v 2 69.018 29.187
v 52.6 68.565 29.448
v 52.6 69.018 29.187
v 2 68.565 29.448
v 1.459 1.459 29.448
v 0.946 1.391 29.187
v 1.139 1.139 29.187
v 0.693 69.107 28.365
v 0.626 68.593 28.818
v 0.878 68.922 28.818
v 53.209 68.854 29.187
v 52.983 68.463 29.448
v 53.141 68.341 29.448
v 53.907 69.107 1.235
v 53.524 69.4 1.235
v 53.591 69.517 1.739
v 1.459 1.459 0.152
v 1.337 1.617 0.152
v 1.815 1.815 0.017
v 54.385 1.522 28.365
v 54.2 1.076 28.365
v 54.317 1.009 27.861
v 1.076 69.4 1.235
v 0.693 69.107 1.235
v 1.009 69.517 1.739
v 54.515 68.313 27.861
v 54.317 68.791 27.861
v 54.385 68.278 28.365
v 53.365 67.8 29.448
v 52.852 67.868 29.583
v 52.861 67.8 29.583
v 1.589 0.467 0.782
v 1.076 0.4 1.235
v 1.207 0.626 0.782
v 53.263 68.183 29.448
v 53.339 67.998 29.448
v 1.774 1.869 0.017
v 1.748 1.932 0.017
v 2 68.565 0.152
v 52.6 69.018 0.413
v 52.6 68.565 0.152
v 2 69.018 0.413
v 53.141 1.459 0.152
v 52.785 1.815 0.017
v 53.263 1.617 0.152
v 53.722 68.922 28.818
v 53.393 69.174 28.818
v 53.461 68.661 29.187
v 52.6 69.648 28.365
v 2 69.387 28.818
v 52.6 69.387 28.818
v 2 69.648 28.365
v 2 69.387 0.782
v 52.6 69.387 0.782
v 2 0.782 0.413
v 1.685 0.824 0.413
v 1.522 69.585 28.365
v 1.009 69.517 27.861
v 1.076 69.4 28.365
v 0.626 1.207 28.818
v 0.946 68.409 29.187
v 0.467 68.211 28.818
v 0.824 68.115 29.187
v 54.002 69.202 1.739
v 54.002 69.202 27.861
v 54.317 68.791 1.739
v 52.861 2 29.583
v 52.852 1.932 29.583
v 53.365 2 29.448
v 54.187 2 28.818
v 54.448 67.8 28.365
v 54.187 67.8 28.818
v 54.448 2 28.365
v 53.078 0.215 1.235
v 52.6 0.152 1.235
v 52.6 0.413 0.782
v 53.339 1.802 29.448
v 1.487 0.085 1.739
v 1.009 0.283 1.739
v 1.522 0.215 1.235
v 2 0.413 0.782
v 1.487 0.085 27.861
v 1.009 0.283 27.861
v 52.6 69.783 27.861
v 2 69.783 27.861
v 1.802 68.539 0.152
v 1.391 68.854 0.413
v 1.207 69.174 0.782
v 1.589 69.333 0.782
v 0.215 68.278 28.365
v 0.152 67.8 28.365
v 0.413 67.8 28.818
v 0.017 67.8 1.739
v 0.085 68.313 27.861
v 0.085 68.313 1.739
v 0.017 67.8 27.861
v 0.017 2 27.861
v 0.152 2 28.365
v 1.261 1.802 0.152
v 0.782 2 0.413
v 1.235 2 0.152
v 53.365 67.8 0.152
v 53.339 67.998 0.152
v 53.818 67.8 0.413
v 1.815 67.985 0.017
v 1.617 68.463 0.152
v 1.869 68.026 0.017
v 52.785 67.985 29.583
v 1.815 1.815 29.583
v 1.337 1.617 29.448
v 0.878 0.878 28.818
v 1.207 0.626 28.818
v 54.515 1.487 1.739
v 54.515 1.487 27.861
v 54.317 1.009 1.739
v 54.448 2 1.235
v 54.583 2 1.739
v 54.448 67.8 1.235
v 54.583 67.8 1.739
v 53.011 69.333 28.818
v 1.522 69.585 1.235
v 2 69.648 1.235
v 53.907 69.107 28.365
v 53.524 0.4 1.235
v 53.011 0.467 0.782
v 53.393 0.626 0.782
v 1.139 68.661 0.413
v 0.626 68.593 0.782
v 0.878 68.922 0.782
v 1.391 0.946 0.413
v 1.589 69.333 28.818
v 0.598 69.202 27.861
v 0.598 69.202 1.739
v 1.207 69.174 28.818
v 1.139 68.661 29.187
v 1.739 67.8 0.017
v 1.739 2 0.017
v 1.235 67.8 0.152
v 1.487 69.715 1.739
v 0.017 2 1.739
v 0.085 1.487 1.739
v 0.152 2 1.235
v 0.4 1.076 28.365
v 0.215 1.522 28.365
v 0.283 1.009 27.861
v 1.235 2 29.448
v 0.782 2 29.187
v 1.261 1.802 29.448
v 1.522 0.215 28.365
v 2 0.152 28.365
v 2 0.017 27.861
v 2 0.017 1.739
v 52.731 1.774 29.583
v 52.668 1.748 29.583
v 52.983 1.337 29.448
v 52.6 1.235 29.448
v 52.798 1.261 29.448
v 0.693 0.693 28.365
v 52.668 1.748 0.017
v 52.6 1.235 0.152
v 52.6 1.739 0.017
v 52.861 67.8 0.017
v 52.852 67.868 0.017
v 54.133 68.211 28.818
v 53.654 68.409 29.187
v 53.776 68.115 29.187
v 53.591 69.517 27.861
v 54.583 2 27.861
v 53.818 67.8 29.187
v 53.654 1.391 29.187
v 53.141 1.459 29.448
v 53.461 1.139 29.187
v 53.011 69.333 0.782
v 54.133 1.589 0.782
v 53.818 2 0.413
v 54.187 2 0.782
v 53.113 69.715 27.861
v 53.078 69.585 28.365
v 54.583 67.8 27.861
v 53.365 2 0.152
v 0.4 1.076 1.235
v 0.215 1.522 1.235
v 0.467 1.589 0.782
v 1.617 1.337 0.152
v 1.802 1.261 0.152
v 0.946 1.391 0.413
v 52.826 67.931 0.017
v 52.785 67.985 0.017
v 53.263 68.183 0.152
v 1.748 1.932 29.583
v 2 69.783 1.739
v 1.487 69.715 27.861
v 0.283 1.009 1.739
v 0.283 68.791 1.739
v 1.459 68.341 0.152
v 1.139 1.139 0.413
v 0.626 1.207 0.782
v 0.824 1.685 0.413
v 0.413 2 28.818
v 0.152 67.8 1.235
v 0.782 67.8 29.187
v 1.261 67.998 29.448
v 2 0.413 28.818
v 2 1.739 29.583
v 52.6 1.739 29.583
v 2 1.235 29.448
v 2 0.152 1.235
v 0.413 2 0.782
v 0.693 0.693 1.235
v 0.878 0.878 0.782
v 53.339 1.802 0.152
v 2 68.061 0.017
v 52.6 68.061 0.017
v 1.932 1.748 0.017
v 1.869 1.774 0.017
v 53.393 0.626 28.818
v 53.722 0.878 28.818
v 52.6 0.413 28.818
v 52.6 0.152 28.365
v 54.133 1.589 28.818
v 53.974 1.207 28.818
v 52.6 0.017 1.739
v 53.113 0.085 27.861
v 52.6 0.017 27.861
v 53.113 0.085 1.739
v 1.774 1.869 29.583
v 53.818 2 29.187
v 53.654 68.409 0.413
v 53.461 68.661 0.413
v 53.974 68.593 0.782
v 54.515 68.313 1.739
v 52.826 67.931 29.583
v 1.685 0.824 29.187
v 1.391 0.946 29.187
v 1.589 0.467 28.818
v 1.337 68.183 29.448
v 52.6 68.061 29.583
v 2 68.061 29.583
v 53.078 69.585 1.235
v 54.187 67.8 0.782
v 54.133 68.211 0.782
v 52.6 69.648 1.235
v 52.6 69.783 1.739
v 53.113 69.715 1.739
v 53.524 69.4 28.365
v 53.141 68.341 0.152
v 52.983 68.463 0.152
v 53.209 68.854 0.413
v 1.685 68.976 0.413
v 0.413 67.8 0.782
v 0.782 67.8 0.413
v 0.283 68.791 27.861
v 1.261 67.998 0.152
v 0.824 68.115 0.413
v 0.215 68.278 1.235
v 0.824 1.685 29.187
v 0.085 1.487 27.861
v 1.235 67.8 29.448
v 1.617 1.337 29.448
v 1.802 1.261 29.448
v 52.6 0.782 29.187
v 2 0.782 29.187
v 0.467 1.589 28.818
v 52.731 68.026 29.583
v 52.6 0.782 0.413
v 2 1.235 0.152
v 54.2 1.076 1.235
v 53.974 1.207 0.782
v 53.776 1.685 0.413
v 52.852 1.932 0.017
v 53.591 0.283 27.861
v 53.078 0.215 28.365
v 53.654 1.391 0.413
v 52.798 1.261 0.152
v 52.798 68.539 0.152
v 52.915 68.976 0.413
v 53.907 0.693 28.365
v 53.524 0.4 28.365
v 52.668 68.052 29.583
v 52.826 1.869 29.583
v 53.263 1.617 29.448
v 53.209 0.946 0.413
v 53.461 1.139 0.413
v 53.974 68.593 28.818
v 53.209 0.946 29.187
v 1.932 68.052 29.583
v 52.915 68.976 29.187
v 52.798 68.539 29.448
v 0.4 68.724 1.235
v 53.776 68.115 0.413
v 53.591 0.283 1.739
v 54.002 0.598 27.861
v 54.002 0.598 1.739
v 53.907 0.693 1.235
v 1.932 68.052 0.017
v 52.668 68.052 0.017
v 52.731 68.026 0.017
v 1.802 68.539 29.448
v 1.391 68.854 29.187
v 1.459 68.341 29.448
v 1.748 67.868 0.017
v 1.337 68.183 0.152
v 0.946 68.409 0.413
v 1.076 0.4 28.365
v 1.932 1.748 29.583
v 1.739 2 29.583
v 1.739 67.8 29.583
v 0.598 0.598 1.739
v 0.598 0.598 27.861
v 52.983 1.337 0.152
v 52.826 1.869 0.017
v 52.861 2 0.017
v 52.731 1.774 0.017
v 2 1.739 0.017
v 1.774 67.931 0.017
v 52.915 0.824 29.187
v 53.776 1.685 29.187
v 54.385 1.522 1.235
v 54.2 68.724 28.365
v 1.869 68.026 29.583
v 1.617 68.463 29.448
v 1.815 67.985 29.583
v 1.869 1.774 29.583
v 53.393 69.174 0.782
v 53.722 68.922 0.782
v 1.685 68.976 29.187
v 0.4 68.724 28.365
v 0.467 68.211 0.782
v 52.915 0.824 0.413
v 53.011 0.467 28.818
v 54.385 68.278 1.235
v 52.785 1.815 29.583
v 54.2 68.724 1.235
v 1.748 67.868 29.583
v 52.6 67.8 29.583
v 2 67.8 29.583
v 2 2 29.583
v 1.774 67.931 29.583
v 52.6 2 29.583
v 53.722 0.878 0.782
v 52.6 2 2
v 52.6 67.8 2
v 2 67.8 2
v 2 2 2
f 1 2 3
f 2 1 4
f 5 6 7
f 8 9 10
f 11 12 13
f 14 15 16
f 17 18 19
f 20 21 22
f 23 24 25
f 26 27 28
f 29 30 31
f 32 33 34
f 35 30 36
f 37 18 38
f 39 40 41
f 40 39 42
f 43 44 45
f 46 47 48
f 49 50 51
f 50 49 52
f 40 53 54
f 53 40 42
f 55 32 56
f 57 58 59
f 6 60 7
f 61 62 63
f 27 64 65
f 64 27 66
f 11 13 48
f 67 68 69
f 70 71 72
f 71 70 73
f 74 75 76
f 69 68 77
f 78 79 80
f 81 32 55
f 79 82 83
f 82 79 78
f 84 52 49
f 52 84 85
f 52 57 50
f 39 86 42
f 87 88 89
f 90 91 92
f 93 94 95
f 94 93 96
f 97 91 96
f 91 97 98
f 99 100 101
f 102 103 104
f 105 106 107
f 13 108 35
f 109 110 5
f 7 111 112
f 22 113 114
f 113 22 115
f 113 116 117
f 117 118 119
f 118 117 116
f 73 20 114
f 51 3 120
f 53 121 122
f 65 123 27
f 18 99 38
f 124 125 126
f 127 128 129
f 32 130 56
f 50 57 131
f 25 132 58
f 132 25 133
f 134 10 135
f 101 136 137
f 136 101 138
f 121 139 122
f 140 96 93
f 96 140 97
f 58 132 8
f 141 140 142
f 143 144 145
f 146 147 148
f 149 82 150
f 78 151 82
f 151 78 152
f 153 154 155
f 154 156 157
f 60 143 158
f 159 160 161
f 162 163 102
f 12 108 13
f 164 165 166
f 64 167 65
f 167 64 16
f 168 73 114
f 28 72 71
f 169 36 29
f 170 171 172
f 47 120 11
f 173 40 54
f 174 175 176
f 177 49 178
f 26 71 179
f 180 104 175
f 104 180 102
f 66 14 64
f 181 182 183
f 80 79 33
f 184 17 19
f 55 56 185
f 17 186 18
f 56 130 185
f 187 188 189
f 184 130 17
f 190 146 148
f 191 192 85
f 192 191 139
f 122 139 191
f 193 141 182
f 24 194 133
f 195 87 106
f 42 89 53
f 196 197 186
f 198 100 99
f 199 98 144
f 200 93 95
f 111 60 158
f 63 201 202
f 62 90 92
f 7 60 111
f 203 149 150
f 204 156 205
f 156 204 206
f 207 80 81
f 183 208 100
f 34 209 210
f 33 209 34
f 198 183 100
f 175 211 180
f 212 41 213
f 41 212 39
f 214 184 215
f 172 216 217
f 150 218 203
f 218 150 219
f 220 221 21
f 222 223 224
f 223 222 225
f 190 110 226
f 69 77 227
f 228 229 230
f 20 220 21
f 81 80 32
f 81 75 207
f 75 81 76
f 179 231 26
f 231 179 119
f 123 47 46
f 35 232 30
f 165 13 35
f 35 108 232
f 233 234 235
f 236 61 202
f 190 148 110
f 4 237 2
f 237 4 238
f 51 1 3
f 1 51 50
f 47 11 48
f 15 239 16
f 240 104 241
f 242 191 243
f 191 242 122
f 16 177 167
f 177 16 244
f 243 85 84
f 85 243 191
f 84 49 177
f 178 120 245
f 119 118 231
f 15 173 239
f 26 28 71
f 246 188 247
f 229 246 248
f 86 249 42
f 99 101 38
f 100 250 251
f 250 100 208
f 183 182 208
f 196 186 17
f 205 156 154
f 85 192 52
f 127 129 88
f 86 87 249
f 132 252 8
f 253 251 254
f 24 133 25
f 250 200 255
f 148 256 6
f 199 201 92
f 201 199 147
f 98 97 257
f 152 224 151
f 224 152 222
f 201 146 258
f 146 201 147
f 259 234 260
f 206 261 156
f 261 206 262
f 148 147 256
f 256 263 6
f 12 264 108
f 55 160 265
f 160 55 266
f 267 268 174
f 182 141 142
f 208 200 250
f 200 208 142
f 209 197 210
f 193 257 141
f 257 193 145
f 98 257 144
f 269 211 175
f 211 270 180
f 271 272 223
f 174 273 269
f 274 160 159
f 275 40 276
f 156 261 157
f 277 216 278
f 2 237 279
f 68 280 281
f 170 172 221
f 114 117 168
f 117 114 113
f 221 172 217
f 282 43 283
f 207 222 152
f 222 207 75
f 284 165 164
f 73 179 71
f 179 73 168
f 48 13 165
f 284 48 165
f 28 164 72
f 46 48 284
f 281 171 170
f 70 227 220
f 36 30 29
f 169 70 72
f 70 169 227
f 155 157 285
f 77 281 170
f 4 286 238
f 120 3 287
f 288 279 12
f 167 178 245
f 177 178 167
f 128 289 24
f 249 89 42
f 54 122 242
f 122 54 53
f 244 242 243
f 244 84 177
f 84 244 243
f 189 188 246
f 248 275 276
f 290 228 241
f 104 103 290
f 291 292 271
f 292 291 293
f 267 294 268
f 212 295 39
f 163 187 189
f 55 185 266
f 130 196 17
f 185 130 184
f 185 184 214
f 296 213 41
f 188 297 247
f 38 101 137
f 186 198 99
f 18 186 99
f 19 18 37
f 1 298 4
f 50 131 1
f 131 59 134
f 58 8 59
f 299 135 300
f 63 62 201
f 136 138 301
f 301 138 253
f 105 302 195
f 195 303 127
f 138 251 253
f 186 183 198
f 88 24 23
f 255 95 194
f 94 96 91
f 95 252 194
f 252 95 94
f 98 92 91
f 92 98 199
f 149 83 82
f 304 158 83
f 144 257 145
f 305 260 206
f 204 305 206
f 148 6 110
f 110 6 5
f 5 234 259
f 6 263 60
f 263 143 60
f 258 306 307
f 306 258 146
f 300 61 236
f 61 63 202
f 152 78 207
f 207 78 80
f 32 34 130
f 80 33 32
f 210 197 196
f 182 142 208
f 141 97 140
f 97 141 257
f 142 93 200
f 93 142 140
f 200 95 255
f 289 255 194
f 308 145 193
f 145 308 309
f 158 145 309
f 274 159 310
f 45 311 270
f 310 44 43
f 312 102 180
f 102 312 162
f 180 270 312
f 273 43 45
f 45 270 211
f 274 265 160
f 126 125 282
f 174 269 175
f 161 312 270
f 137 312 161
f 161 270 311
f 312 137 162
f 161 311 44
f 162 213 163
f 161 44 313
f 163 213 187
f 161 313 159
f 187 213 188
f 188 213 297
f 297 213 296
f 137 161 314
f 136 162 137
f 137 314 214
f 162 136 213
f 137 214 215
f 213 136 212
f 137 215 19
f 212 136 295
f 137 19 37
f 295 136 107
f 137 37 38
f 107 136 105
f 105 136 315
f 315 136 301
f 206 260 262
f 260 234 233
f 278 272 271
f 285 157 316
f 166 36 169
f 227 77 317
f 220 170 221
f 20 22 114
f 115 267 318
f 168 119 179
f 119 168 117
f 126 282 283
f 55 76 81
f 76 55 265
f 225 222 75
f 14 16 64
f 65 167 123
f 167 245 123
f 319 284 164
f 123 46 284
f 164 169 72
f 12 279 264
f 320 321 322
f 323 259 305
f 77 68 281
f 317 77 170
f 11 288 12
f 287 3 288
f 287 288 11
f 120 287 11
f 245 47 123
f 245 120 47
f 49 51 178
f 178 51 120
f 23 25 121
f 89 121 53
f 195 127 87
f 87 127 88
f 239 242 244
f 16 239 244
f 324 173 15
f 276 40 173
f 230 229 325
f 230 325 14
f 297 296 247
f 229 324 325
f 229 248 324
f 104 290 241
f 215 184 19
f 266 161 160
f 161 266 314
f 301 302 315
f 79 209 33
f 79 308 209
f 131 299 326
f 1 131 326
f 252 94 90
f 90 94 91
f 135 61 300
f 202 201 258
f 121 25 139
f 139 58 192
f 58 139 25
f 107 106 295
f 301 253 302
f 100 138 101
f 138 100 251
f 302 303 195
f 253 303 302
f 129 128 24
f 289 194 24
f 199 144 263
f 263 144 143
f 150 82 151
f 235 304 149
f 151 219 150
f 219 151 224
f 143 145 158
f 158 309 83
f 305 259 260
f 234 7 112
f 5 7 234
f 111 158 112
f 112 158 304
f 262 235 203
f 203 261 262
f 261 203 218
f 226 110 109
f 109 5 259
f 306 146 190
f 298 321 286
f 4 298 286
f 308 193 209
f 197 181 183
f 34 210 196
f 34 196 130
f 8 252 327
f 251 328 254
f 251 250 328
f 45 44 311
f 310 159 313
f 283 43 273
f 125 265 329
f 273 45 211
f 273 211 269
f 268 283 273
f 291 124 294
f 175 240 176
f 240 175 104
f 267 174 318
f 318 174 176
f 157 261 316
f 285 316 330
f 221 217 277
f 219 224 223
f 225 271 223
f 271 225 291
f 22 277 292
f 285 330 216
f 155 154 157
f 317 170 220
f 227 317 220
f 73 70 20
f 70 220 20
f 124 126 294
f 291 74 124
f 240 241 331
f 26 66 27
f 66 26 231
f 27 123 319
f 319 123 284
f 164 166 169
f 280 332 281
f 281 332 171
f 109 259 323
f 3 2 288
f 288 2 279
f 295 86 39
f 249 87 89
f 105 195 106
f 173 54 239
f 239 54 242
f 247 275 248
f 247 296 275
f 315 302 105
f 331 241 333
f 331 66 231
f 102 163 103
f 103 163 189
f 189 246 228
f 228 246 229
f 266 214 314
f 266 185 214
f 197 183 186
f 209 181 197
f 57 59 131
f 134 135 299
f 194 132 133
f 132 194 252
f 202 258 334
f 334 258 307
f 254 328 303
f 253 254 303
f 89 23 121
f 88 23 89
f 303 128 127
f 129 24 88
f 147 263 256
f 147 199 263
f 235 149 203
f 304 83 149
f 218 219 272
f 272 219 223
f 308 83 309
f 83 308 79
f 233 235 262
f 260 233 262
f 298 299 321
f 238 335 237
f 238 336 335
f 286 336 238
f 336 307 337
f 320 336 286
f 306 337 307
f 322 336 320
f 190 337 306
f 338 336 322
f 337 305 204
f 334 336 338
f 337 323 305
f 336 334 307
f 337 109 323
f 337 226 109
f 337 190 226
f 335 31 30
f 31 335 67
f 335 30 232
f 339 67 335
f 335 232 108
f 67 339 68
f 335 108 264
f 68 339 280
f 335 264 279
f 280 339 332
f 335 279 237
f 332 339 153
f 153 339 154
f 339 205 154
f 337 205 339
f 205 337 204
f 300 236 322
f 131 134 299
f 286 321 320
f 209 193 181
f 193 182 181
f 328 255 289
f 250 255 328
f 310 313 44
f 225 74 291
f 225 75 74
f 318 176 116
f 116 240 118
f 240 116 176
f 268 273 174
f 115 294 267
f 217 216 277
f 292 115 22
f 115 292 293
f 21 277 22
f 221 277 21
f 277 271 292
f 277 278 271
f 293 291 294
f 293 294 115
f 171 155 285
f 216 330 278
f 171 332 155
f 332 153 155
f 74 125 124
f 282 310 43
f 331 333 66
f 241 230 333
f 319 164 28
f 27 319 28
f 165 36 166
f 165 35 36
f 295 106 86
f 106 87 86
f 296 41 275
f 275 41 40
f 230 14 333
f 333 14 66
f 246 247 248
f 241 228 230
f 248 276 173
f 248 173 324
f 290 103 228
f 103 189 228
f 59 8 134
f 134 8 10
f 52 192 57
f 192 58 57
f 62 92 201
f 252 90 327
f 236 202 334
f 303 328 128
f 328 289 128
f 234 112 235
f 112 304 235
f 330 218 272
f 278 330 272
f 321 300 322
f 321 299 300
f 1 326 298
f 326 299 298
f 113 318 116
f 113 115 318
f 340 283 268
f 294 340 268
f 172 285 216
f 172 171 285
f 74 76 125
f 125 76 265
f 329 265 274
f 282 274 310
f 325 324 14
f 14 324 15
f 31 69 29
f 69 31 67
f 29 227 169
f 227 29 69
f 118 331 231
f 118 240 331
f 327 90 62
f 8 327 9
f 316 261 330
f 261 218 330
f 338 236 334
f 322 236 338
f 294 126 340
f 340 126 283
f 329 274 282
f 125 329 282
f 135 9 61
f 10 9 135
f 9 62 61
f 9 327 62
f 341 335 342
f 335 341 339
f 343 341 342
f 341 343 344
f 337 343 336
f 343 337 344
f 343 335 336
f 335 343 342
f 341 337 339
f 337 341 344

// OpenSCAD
gyd_sz = 35;
gyd_m = 15;
gyd_h = 55;

nagy_gyd_sz = gyd_h;
nagy_gyd_m = gyd_m * 2;
nagy_gyd_h = gyd_sz * 2;


fv = 2; //falvastagság
gap = 0.2;
db_v = 2; // fakkok száma vízszintesen
db_f = 3; // fakkok száma függőlegesen
keret_sz = db_v * (fv + 2 * gap) + fv + 2 * nagy_gyd_sz;
keret_m = db_f * (fv + 2 * gap) + fv + 3 * nagy_gyd_m;
keret_h = fv + nagy_gyd_h;


delta_sz = nagy_gyd_sz + fv + 2 * gap;
delta_m = nagy_gyd_m + fv + 2 * gap;

//translate([fv + gap, 0, fv + gap]) fiok();
//keret();
fiok();
//felso_fiok();

//gombolyitett_cube([100,120,130]);


    
module gombolyitett_cube(dims){
    r=fv;
    translate([r,r,r])minkowski(){
       cube(dims - 2 * [r,r,r]);
       sphere(r, $fn=12*r);
    }
} 
module keret(){
    difference(){
        gombolyitett_cube([keret_sz, keret_h, keret_m+gyd_m+fv]);
        for (x = [fv: delta_sz : keret_sz])
            for(z = [fv: delta_m : keret_m-delta_m])
                translate([x,0,z]){
                    cube([nagy_gyd_sz+ 2 * gap, nagy_gyd_h + 2 * gap, nagy_gyd_m + 2 * gap]);
                    translate([nagy_gyd_sz/2, 0, nagy_gyd_m/2])rotate([-90,0,0])cylinder(r=10, h = 100, $fn = 12*10);
                }
        translate([0,0,keret_m]){
            translate([fv, 0, 0])cube([keret_sz - 2 * fv, keret_h - fv, gyd_m]);
            translate([keret_sz/2, 0, gyd_m/2])rotate([-90,0,0])cylinder(r=7, h = 100, $fn = 12*6);
        }
    }
}

module fiok(){
    difference(){
        gombolyitett_cube([nagy_gyd_sz-2*gap, nagy_gyd_h-gap, nagy_gyd_m-2*gap]);
        translate([fv, fv, fv])cube([nagy_gyd_sz-2*fv-2*gap, nagy_gyd_h-2*fv-gap, nagy_gyd_m - fv-2*gap]);
    }
}

module felso_fiok(){
    difference(){
        gombolyitett_cube([keret_sz - 2 * fv - 2 * gap, keret_h - fv, gyd_m - 2 * gap]);
        translate([fv, fv, fv])cube([keret_sz - 2 * fv - 2 * gap - 2*fv, keret_h - fv - 2 * fv, gyd_m - 2 * gap - fv]);
    }
}
